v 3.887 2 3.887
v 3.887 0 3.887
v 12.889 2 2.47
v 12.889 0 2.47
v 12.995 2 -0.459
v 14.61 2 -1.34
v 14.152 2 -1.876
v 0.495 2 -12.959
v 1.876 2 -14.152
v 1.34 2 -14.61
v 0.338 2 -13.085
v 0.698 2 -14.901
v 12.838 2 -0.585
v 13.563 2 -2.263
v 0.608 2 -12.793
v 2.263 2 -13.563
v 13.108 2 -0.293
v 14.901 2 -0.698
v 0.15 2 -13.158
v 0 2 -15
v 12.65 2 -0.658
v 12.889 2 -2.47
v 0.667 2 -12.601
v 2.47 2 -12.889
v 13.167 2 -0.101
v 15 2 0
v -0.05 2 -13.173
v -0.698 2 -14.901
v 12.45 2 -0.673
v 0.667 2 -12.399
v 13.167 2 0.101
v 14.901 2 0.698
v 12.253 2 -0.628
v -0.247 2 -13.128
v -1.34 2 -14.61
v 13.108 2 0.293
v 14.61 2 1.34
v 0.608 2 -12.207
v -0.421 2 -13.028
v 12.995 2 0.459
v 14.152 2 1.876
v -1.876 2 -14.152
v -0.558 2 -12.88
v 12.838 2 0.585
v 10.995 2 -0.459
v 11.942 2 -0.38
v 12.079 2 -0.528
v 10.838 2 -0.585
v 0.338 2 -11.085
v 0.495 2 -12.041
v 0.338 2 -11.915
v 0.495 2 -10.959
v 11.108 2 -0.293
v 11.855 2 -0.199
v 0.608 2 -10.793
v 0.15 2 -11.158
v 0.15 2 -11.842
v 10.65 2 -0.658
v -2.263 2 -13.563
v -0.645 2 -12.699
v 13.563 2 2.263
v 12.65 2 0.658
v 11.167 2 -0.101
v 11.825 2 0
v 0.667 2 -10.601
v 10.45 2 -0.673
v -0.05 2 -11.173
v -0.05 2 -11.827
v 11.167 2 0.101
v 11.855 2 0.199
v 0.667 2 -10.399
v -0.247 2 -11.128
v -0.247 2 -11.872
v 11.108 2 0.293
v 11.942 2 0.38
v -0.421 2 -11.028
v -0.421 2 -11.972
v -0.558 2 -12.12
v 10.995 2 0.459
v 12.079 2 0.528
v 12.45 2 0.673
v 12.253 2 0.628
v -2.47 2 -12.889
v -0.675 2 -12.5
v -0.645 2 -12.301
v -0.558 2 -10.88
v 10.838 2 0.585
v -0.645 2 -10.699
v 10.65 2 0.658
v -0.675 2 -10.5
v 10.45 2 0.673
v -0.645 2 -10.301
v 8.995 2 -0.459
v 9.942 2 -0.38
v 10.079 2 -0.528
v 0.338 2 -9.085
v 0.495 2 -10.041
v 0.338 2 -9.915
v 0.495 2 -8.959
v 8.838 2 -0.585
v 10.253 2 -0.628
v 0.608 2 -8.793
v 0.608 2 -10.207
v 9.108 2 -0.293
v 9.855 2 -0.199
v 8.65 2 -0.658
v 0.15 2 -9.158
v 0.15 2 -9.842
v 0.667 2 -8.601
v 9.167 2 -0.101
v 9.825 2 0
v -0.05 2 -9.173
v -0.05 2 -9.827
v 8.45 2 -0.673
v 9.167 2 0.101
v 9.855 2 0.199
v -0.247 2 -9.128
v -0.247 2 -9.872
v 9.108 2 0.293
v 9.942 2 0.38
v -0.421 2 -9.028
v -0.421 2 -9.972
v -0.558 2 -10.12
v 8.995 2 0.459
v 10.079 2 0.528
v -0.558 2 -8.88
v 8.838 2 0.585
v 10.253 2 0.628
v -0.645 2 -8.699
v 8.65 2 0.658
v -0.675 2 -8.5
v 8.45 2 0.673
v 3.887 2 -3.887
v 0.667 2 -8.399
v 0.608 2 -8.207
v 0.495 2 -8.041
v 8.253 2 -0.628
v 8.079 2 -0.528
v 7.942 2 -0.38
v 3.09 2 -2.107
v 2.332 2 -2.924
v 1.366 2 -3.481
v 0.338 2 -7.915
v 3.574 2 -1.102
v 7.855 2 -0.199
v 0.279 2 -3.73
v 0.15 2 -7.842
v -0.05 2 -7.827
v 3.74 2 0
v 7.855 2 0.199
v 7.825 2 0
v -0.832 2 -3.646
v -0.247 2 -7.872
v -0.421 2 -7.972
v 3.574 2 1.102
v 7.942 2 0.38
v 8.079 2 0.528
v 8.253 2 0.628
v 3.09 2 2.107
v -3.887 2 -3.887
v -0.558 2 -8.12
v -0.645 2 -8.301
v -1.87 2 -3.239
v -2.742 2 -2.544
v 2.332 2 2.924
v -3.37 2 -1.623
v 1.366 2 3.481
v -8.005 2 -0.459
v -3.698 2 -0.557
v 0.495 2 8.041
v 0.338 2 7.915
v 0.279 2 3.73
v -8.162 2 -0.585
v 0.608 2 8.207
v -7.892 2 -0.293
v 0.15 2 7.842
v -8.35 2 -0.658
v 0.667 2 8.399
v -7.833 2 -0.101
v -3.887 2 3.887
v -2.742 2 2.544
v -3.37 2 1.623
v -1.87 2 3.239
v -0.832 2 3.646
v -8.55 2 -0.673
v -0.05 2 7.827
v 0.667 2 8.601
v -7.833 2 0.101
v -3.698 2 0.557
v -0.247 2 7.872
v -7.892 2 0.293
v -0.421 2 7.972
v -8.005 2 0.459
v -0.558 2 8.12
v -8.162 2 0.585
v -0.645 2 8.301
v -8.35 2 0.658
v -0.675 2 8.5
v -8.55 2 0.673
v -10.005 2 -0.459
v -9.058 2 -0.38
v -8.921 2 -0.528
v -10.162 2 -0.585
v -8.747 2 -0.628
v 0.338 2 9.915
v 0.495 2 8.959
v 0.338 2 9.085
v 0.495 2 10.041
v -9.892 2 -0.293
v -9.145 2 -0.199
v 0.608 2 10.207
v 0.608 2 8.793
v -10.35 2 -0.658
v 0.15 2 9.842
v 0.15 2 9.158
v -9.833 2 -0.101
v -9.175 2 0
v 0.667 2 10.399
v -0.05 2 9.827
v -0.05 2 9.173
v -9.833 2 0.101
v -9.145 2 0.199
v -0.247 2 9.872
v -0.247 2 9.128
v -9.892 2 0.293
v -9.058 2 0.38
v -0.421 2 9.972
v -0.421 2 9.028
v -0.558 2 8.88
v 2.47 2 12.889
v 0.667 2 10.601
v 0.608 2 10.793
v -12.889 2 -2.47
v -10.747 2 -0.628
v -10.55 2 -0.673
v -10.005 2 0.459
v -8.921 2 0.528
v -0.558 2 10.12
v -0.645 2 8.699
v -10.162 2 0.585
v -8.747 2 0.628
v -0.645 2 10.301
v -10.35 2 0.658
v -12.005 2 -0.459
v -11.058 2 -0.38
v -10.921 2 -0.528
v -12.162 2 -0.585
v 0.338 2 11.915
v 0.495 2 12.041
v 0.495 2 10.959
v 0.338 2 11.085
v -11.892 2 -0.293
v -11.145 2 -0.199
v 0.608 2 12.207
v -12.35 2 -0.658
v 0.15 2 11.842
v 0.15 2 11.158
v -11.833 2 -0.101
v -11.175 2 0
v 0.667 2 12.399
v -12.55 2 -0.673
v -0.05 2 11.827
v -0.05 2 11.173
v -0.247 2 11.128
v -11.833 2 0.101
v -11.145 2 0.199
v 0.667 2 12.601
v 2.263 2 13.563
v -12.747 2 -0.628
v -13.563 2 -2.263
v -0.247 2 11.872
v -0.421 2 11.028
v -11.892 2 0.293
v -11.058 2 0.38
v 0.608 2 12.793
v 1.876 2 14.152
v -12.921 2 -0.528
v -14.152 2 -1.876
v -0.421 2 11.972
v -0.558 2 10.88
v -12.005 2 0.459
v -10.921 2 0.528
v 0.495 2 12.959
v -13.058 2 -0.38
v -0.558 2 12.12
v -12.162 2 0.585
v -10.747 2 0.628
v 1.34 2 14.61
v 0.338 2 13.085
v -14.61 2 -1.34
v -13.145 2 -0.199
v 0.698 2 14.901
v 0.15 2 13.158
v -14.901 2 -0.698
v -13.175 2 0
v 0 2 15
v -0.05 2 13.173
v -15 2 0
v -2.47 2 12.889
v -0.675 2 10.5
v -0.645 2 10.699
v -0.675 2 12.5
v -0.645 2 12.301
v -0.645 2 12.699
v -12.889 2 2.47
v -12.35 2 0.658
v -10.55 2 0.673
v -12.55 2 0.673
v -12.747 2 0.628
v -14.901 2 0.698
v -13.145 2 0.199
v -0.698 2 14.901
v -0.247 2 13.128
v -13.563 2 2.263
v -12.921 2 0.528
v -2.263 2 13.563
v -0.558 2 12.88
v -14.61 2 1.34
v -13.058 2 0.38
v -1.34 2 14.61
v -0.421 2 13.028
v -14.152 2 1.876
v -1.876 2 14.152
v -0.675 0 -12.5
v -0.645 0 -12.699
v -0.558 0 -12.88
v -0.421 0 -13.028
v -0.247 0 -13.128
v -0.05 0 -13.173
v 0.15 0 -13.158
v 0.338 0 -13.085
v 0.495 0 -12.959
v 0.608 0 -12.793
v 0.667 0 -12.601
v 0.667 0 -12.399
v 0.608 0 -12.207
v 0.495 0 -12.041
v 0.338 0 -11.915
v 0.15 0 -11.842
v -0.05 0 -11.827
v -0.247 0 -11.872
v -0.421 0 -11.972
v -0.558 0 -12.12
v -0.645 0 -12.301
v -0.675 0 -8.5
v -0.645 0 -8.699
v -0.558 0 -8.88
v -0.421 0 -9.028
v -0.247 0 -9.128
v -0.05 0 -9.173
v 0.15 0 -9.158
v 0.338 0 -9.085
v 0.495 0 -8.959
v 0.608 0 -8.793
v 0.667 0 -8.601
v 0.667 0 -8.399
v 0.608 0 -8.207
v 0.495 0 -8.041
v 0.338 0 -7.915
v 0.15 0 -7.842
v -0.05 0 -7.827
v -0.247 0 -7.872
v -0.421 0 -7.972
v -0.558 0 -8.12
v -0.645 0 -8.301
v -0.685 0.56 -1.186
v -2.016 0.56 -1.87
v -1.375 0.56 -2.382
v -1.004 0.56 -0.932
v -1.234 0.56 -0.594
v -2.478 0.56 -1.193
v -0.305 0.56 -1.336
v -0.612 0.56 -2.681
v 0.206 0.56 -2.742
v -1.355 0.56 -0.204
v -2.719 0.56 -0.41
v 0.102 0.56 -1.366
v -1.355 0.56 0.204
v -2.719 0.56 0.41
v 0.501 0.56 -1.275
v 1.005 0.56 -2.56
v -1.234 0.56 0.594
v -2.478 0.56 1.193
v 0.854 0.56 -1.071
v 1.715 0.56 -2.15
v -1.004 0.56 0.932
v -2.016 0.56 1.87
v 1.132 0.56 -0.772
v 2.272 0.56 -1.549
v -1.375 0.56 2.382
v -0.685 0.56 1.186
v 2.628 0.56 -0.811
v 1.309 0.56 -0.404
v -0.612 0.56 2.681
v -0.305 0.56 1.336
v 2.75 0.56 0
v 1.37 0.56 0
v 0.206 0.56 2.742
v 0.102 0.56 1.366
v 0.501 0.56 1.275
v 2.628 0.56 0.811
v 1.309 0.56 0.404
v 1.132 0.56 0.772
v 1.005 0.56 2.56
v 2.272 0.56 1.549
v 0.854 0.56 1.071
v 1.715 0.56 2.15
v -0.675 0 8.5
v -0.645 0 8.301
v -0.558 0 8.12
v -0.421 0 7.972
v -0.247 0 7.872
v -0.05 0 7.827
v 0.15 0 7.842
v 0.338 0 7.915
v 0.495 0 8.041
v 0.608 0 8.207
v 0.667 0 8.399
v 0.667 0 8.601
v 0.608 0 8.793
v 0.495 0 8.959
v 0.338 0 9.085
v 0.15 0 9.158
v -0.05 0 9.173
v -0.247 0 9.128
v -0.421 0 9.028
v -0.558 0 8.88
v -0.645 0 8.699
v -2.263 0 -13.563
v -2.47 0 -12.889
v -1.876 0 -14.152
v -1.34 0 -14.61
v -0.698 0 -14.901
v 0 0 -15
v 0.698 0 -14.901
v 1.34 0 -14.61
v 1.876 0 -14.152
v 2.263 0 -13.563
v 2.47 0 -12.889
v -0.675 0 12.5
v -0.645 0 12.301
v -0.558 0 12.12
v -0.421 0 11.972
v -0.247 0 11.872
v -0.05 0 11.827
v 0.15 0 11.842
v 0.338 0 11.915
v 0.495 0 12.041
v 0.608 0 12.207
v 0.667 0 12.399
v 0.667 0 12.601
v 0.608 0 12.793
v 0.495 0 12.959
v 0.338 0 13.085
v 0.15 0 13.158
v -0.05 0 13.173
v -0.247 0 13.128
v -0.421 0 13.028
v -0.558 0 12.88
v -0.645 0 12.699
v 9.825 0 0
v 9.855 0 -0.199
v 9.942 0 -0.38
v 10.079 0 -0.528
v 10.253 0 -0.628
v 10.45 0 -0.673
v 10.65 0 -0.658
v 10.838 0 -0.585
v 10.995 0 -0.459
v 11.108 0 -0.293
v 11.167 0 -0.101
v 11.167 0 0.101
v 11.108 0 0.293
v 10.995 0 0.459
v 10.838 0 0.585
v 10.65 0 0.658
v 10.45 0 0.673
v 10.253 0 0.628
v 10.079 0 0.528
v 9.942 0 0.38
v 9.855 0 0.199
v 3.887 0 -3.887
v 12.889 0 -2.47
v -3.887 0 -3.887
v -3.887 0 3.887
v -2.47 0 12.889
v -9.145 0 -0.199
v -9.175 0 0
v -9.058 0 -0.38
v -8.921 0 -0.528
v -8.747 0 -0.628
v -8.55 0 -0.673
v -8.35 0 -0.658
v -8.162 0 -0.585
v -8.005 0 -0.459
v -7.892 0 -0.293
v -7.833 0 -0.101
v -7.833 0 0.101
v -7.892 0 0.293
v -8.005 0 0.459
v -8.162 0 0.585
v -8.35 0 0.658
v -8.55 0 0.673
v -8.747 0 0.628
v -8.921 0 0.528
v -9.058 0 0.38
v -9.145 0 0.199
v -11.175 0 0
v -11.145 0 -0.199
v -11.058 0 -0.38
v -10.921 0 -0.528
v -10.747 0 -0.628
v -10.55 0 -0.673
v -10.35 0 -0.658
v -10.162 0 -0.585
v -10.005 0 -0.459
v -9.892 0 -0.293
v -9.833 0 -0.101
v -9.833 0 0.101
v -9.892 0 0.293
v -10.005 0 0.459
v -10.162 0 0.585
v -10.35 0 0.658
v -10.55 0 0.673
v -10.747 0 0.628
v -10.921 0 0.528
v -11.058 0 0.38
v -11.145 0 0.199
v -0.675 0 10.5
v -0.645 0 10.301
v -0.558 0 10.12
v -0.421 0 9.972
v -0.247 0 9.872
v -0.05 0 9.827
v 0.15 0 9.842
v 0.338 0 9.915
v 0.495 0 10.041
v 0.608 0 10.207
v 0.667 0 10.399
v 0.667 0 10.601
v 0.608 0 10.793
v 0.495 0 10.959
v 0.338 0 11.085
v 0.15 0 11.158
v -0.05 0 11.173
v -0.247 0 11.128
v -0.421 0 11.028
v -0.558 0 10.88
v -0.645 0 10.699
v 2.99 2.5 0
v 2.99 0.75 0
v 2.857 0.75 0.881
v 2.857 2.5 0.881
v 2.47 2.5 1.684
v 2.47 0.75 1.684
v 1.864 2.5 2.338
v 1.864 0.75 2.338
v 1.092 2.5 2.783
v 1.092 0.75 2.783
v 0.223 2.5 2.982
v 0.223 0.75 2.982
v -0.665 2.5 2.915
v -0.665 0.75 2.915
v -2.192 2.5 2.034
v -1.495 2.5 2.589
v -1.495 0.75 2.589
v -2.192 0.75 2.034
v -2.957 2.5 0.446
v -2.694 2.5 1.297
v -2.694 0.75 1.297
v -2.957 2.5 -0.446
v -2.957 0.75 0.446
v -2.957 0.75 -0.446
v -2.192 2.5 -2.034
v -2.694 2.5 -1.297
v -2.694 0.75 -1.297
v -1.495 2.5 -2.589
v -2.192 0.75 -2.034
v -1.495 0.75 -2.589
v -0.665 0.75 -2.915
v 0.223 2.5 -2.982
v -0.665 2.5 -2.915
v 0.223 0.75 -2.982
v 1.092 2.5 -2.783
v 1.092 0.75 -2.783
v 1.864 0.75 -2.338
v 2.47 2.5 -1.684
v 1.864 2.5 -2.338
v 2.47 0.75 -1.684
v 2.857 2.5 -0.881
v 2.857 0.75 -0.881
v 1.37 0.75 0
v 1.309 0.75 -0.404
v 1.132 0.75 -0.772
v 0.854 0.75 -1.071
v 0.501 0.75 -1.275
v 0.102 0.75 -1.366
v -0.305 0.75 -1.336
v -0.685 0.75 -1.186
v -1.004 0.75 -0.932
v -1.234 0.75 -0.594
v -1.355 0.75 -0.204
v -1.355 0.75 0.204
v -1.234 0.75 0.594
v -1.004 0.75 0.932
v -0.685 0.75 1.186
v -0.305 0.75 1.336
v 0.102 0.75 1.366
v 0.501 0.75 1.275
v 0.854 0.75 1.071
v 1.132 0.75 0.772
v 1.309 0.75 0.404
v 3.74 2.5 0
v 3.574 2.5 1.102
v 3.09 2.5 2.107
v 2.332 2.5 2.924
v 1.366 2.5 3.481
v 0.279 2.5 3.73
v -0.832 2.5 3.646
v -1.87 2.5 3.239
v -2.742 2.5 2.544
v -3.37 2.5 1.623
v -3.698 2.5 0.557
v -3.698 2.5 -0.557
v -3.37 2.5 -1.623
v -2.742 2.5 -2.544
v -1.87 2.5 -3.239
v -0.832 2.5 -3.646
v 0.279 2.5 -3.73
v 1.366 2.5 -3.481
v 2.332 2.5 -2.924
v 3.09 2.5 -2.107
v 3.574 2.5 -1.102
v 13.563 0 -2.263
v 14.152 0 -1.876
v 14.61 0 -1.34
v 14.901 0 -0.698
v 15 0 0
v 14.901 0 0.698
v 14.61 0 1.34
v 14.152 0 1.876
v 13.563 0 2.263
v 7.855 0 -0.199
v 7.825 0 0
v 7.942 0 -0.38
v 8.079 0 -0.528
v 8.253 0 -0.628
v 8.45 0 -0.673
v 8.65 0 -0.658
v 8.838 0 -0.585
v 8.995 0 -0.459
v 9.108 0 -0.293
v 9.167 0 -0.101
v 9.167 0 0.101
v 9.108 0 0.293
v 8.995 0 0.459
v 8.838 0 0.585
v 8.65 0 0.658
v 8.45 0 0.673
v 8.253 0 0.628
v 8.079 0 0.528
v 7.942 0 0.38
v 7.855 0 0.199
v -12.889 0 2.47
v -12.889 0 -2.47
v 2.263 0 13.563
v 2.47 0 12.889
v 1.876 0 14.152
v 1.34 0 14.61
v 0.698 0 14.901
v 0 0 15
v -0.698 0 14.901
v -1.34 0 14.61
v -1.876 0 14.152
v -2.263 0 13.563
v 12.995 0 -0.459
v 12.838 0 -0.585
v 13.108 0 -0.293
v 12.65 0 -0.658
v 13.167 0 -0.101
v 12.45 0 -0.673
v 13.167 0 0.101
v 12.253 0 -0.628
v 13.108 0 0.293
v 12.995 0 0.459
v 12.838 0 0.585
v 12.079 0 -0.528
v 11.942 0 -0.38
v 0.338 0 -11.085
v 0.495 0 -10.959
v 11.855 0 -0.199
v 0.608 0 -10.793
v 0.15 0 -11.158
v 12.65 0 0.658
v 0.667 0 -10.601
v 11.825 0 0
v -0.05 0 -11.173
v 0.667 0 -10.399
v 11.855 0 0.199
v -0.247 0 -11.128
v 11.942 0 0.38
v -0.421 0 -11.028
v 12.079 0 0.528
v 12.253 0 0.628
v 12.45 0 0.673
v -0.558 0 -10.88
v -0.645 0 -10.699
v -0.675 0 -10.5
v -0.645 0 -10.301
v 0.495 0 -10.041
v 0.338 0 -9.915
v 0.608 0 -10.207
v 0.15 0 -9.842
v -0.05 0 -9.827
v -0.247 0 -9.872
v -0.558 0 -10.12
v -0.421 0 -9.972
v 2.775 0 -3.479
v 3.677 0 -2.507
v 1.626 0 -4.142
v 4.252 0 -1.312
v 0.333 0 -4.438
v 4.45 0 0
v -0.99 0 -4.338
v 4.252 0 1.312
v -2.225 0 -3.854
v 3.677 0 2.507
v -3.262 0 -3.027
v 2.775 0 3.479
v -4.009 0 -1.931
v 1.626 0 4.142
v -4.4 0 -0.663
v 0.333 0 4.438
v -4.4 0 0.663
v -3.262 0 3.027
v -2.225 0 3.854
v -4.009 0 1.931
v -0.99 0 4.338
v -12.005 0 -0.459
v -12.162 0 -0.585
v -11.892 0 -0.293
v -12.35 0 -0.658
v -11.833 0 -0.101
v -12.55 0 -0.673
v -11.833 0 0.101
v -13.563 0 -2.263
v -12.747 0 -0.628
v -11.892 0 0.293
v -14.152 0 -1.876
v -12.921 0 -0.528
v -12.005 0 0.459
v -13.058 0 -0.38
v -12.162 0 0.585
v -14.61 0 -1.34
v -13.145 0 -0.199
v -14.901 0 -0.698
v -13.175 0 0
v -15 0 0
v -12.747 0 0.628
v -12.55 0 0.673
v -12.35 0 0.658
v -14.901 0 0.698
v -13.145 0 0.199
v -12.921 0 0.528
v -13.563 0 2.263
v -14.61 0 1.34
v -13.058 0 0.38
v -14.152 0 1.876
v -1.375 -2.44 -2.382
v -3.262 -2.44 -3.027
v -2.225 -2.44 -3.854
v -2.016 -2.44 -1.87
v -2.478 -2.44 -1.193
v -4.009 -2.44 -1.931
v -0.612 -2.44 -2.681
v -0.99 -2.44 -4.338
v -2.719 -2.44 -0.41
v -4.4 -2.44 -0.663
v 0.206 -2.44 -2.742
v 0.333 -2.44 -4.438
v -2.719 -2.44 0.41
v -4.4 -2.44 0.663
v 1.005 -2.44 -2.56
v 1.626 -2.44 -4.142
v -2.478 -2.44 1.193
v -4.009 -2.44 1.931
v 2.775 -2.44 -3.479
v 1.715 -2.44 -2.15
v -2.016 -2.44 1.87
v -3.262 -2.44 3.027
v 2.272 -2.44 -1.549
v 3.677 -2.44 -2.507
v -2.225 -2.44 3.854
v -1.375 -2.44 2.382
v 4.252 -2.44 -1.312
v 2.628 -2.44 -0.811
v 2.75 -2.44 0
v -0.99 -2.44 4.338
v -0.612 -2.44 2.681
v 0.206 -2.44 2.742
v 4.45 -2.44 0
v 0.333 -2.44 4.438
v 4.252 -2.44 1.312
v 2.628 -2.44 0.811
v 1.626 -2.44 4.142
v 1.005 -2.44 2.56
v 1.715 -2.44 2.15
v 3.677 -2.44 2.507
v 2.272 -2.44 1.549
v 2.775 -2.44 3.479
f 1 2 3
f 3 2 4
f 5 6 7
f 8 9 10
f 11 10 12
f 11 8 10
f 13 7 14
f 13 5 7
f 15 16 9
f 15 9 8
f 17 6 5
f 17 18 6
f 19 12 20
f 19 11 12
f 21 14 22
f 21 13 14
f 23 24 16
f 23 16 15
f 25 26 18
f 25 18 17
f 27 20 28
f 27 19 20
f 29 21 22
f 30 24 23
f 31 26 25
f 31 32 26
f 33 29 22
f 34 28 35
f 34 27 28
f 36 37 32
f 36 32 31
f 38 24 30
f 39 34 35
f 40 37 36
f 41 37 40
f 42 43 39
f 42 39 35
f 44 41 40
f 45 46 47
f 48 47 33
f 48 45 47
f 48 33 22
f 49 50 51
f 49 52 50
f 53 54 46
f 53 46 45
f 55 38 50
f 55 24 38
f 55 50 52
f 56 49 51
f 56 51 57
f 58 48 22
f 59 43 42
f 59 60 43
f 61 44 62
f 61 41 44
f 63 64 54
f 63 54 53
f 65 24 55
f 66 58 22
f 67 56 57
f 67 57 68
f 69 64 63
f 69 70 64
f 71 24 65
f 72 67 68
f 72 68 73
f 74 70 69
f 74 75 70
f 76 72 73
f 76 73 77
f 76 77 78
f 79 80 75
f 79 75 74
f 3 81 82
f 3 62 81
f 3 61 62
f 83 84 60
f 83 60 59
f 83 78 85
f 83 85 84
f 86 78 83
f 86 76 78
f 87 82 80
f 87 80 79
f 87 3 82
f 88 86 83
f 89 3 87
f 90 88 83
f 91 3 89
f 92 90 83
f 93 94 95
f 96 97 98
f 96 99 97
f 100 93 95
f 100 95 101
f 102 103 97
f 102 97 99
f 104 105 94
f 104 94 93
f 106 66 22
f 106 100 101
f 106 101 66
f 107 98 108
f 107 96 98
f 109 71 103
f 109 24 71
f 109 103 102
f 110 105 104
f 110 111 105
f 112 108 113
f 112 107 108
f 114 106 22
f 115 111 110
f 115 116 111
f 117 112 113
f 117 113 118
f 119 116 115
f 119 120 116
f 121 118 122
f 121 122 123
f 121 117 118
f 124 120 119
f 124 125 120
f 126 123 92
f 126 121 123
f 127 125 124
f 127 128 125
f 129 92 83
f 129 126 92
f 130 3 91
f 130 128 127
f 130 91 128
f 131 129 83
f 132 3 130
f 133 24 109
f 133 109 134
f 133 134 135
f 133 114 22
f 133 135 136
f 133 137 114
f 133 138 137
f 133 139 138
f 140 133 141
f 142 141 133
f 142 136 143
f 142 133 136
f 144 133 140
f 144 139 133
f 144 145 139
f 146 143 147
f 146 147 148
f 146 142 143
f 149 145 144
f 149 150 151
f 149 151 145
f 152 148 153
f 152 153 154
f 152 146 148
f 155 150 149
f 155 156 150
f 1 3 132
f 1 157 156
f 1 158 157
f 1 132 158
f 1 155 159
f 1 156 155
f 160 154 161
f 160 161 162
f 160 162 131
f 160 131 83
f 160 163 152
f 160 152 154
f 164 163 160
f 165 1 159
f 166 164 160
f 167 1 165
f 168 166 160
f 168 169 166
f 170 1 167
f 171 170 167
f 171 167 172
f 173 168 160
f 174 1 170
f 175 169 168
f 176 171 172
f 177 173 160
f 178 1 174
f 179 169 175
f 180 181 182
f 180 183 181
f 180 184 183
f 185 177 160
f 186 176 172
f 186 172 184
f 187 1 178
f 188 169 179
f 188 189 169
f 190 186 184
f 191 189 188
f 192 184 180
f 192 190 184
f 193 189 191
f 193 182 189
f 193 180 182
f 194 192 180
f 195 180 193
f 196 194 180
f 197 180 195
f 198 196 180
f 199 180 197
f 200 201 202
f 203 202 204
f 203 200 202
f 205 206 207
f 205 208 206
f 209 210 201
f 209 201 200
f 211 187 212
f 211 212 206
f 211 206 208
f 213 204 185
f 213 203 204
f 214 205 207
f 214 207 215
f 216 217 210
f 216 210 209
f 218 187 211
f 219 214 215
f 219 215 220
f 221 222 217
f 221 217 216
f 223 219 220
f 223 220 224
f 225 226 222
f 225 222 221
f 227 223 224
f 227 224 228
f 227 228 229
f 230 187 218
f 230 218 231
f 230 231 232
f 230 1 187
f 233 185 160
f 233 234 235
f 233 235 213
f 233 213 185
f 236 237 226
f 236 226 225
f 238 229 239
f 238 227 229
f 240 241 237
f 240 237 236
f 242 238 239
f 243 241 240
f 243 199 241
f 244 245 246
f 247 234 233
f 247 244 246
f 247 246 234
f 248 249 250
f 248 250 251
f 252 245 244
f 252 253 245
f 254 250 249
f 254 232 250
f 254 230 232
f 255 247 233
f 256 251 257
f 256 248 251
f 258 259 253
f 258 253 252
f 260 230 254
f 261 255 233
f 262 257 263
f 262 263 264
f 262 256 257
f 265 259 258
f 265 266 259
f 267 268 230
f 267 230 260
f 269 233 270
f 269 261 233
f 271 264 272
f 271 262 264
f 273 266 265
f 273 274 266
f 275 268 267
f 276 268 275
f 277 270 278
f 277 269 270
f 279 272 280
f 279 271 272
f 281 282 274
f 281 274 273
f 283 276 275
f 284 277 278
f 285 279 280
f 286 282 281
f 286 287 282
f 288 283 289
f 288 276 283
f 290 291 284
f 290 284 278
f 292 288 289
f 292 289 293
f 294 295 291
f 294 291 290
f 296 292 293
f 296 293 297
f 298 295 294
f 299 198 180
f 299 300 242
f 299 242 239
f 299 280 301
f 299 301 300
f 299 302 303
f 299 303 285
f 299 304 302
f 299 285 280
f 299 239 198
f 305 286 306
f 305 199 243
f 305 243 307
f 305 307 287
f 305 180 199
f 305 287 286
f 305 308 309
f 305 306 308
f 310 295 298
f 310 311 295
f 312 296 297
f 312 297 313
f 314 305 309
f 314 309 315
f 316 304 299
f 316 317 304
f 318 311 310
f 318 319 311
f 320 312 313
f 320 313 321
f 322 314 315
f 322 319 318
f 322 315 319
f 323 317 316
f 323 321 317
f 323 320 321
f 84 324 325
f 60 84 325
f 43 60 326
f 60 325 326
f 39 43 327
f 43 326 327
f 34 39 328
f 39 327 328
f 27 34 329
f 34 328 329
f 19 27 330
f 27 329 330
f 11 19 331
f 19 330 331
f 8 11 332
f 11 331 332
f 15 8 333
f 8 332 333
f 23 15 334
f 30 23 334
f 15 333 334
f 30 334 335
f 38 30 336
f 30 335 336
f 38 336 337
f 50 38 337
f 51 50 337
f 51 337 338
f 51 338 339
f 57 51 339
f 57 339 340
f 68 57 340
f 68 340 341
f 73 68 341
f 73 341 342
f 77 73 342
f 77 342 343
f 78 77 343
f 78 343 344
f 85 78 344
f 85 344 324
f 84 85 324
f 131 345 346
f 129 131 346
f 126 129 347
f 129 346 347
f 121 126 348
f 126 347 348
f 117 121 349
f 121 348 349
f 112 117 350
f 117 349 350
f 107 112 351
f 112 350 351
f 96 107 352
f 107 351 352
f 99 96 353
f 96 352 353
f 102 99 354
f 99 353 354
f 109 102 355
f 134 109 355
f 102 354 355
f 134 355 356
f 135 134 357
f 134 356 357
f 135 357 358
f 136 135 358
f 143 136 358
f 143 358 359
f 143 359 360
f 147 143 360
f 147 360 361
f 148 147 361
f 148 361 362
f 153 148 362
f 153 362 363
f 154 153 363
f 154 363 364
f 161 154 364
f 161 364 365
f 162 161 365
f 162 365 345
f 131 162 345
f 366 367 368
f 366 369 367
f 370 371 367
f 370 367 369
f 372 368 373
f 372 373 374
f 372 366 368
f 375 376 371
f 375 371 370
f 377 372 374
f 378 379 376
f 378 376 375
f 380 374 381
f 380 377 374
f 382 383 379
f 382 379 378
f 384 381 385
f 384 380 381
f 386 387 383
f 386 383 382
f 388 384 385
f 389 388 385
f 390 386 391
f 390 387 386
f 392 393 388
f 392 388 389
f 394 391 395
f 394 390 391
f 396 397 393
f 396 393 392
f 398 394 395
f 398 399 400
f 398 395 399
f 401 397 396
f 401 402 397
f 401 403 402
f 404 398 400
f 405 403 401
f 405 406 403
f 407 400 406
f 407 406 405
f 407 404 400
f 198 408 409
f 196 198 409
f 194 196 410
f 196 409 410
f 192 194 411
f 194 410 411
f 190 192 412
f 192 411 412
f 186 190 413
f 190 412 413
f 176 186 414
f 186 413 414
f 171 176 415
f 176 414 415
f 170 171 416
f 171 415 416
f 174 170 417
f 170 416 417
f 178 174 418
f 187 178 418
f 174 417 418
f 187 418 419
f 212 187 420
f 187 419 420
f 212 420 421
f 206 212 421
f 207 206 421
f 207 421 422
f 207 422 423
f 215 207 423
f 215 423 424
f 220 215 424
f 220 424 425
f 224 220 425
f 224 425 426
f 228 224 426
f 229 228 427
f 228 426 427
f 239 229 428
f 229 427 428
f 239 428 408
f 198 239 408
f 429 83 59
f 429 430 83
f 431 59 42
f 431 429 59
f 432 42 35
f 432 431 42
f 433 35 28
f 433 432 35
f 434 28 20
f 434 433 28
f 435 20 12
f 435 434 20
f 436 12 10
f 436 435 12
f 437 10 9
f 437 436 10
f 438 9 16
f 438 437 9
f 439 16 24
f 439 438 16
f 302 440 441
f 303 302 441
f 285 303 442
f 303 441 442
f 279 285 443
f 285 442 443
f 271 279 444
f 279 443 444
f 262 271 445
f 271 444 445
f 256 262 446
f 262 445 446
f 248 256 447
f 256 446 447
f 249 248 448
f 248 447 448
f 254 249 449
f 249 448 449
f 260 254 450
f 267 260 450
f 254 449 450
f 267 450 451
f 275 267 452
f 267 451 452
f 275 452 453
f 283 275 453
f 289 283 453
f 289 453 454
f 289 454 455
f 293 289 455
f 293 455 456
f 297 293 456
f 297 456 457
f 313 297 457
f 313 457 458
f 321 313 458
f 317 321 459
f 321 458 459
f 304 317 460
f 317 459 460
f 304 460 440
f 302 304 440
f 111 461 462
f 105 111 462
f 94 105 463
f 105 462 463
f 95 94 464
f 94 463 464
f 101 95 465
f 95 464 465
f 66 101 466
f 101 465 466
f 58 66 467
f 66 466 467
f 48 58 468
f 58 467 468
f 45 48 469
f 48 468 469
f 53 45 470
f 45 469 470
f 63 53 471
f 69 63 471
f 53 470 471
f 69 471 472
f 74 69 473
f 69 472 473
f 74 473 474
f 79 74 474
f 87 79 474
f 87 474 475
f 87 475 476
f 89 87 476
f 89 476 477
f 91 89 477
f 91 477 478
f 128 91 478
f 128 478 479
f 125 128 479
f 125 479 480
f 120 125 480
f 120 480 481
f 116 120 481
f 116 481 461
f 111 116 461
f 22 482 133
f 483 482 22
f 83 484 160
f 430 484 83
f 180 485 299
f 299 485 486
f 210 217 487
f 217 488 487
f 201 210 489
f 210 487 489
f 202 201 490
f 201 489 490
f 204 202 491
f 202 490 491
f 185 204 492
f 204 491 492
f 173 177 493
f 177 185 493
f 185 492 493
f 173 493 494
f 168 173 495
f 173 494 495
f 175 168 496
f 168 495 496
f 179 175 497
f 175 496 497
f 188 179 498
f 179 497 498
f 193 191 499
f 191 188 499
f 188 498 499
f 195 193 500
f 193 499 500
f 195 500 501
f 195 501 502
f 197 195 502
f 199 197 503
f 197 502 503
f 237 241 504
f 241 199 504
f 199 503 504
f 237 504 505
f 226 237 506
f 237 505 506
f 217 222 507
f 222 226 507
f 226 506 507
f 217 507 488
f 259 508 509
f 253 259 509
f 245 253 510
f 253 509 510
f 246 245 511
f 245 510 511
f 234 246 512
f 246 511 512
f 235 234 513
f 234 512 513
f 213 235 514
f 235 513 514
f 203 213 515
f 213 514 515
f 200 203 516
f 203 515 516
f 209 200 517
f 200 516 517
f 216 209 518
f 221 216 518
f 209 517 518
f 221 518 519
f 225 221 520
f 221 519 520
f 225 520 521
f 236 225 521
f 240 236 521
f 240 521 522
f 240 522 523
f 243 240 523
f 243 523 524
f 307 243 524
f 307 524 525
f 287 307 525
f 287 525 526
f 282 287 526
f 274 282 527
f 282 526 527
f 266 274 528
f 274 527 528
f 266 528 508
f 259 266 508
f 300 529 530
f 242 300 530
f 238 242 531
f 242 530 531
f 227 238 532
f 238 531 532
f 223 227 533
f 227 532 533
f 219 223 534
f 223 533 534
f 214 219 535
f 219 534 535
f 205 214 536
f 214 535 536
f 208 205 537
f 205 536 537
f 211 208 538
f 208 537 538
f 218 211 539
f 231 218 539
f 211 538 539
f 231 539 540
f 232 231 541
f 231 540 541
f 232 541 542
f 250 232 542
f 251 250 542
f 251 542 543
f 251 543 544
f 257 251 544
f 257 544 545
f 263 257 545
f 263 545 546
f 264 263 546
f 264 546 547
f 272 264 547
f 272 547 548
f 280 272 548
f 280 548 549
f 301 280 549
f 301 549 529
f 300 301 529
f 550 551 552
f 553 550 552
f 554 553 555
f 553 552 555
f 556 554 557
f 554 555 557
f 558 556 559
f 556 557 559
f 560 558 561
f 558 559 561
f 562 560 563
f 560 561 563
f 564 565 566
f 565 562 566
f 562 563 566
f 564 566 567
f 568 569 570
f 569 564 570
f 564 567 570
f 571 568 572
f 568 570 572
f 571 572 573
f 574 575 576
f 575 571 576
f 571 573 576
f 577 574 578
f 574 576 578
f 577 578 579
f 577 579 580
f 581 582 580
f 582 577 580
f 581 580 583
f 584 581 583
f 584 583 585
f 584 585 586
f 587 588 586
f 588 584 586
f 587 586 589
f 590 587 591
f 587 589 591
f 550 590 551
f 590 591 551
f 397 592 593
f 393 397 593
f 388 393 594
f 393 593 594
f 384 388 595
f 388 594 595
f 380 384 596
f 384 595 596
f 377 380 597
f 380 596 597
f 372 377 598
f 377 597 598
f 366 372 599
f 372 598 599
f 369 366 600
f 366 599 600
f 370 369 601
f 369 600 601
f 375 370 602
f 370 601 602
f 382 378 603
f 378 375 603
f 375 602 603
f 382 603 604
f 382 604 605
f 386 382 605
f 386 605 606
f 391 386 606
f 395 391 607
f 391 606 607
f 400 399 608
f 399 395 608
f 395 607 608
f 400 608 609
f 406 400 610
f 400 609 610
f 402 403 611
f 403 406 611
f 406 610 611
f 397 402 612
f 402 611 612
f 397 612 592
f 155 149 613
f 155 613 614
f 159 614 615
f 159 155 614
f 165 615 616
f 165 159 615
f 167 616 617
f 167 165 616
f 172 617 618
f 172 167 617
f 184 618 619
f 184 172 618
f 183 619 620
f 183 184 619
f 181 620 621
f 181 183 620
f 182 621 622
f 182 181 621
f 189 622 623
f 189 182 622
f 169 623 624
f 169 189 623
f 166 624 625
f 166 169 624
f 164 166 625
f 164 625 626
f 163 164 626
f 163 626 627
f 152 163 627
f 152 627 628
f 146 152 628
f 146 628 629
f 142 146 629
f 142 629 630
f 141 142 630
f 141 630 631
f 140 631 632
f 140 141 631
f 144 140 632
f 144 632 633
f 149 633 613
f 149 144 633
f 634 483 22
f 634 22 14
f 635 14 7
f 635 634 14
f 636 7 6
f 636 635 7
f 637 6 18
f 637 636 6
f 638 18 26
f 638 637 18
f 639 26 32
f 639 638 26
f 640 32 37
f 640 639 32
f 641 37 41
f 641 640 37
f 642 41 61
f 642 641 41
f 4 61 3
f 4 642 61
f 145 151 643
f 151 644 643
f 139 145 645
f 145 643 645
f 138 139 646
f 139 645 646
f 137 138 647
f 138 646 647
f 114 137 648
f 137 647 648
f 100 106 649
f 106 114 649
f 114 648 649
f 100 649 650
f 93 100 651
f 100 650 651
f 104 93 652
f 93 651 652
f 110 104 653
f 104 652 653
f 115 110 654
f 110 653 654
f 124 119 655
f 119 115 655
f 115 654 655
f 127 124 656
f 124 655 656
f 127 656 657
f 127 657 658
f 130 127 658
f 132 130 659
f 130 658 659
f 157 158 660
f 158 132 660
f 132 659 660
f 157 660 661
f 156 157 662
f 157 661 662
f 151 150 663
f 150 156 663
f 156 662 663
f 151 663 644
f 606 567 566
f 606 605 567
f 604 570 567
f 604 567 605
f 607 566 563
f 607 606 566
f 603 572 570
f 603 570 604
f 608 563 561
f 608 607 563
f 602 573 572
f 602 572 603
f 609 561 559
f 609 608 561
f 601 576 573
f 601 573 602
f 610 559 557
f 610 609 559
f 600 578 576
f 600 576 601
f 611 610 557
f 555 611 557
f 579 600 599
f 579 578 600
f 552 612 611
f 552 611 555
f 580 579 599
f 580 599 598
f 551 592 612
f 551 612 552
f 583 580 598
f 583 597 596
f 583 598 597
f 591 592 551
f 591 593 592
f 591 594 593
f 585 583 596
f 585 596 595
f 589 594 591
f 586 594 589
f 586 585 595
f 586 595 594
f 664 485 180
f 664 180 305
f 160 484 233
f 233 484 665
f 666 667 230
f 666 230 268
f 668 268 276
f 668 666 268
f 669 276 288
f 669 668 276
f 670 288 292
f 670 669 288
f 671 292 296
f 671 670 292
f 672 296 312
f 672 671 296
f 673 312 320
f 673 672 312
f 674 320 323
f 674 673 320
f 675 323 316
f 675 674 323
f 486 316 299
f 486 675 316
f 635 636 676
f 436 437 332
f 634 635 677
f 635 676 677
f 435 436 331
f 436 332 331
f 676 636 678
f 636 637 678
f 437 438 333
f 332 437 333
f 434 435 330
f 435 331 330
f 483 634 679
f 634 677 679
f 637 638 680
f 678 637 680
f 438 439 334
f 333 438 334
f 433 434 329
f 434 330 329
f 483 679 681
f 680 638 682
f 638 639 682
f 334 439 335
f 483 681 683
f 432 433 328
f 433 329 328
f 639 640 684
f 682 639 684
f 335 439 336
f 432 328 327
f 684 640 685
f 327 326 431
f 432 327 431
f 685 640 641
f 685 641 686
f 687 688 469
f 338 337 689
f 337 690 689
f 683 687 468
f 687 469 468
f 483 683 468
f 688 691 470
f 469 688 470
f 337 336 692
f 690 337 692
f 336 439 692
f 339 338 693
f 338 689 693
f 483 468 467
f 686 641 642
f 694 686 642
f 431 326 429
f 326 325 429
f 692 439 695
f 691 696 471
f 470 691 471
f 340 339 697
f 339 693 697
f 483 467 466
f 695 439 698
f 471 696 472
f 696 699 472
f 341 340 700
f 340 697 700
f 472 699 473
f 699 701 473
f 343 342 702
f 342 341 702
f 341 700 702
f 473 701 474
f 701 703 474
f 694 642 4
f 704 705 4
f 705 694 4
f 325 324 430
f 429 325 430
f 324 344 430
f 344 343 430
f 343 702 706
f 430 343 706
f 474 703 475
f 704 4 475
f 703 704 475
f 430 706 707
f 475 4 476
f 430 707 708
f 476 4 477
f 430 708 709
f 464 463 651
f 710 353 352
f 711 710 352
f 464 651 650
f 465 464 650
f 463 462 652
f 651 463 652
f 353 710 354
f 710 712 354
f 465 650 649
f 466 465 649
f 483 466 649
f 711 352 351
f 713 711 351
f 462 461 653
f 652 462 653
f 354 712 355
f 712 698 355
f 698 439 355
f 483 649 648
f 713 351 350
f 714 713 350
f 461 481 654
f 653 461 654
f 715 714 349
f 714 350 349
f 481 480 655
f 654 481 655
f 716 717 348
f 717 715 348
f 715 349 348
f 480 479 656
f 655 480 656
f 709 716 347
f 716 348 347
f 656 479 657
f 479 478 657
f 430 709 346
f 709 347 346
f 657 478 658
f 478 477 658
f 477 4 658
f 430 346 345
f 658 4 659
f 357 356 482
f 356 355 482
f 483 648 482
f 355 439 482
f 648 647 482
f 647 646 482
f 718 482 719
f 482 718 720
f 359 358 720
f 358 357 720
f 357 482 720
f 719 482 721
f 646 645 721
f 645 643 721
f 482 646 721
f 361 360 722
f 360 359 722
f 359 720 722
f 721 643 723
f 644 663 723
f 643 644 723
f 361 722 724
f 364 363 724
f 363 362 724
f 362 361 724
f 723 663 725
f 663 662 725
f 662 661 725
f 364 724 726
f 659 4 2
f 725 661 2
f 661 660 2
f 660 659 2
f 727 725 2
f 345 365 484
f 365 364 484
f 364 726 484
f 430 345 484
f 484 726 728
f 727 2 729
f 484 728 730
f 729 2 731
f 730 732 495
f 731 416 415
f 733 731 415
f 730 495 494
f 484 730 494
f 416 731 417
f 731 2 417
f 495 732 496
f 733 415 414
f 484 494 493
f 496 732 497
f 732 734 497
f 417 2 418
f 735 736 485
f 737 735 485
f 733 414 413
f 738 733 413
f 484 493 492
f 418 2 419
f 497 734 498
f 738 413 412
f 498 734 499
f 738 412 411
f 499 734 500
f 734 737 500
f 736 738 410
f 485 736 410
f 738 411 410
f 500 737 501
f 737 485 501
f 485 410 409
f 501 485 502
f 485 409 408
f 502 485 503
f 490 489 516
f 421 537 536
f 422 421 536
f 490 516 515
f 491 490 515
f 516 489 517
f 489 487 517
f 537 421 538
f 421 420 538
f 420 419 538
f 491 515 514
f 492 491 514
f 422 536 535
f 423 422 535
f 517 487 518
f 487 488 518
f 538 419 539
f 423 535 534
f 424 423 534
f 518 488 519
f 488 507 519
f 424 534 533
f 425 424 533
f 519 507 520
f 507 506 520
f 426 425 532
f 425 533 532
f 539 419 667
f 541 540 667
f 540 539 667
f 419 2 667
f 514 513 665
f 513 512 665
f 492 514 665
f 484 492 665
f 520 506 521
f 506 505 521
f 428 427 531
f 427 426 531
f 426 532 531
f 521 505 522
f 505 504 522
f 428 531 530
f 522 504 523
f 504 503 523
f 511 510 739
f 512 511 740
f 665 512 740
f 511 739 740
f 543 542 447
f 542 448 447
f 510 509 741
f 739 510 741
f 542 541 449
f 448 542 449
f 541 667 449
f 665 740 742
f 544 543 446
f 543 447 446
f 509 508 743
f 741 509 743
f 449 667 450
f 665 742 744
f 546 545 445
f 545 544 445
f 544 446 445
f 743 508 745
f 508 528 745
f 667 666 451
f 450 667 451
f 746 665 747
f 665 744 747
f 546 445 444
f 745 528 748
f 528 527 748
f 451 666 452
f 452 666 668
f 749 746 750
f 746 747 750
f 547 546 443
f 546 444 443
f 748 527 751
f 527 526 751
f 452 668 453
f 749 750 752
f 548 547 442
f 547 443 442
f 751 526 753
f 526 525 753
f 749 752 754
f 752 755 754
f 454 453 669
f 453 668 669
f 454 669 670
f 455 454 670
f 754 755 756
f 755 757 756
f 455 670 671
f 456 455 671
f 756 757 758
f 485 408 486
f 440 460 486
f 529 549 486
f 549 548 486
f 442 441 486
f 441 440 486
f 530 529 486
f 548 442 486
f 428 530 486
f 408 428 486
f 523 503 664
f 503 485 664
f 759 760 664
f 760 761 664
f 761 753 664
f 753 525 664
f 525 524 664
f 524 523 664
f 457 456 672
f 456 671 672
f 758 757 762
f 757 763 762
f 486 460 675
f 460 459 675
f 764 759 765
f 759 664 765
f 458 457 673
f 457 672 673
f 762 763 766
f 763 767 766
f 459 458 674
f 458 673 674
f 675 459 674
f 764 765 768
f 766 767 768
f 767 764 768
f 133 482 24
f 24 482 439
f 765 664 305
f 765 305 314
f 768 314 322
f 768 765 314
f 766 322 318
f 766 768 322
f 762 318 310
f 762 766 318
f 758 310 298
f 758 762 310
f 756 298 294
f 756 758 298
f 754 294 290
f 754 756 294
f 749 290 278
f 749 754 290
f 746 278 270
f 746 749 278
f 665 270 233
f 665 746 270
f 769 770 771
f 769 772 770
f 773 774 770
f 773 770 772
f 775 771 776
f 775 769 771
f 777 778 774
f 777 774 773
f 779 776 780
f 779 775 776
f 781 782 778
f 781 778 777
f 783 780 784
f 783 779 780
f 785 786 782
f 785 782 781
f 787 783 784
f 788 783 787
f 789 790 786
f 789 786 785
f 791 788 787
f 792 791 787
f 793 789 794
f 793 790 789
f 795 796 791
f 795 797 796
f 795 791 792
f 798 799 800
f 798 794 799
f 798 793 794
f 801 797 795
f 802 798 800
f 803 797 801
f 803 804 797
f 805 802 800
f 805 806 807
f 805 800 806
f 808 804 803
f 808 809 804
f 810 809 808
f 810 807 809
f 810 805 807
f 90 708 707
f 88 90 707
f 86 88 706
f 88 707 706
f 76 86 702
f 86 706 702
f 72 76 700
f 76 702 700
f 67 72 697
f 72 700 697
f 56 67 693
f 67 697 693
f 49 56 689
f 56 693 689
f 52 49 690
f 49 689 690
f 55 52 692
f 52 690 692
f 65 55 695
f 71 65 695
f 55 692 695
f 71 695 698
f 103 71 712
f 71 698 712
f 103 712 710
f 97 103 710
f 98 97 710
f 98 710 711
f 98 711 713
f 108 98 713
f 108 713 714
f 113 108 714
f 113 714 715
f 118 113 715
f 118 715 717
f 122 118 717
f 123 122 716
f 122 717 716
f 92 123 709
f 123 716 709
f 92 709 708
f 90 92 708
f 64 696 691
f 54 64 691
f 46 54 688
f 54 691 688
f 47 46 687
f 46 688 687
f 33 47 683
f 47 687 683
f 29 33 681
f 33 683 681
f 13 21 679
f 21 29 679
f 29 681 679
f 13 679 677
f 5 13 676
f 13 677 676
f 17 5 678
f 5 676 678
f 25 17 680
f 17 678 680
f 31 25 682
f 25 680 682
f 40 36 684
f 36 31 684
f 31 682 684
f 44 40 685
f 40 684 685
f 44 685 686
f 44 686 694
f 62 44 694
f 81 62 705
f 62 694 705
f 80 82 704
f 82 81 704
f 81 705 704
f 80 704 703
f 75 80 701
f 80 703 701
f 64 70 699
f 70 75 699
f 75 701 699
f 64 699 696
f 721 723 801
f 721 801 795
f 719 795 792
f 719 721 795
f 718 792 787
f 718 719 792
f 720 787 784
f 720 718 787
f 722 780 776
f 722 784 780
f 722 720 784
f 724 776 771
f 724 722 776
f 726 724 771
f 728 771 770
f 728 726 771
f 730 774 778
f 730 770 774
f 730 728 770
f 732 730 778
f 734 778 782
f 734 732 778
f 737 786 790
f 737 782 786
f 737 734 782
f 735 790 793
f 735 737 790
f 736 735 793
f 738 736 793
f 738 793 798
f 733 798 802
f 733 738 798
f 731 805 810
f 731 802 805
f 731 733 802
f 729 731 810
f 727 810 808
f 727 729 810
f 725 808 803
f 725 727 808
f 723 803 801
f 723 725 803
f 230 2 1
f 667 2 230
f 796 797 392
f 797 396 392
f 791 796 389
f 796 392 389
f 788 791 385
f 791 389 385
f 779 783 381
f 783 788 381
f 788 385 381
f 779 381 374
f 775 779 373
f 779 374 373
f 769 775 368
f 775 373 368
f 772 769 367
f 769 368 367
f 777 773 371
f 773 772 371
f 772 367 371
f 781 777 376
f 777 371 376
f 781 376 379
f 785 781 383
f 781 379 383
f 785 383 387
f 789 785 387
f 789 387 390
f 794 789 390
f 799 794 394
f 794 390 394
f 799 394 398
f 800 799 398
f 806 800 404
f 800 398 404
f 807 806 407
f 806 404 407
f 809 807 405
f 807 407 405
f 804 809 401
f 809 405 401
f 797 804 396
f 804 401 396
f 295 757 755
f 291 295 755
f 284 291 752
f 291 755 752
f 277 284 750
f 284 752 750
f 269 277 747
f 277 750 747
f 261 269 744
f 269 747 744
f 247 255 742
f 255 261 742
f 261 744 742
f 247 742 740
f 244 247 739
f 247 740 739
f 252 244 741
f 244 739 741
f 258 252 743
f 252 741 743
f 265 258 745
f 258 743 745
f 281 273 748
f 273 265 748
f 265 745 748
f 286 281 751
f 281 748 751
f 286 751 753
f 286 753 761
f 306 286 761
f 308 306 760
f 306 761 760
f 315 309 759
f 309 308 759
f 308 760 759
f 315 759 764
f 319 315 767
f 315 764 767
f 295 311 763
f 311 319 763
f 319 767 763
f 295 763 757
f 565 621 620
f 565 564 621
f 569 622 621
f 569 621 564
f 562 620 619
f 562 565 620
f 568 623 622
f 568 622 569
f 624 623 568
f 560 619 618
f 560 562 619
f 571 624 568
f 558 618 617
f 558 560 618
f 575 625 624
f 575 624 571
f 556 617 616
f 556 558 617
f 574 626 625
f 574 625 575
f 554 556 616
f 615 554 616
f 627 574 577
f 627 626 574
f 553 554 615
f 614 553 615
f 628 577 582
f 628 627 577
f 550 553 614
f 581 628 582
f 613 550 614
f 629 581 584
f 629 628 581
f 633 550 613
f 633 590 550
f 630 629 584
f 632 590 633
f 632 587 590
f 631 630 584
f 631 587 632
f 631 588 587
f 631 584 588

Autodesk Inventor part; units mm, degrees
ref_plane "YZ Plane" through (0, 0, 0) normal (1, 0, 0) x (0, 1, 0)
ref_plane "XZ Plane" through (0, 0, 0) normal (0, 1, 0) x (-1, 0, 0)
ref_plane "XY Plane" through (0, 0, 0) normal (0, 0, 1) x (1, 0, 0)
sketch "Sketch1" plane through (0, 0, 0) normal (0, 1, 0) x (-1, 0, 0)
  circle A0 centre (0, 0) radius 10.5 construction
  circle A1 centre (0, 0) radius 12.5 construction
  circle A2 centre (0, 0) radius 8.5 construction
  circle A3 centre (12.5, 0) radius 2.5
  circle A4 centre (12.5, 0) radius 0.675
  circle A5 centre (10.5, 0) radius 0.675
  circle A6 centre (8.5, 0) radius 0.675
  line L0 (0, 16.4462) -> (0, -19.2601)
  circle A7 centre (0, 12.5) radius 0.675
  circle A8 centre (0, 10.5) radius 0.675
  circle A9 centre (0, 12.5) radius 2.5
  circle A10 centre (0, 8.5) radius 0.675
  circle A11 centre (-12.5, 0) radius 0.675
  circle A12 centre (-10.5, 0) radius 0.675
  circle A13 centre (-12.5, 0) radius 2.5
  circle A14 centre (-8.5, 0) radius 0.675
  circle A15 centre (0, -12.5) radius 0.675
  circle A16 centre (0, -10.5) radius 0.675
  circle A17 centre (0, -12.5) radius 2.5
  circle A18 centre (0, -8.5) radius 0.675
  line L1 (0, 0) -> (7.0711, -7.0711) construction
  line L2 (0, 0) -> (10, 0) construction
  line L3 (0, 0) -> (7.0711, 7.0711) construction
  line L4 (0, 0) -> (10, 0) construction
  line L5 (0, 0) -> (7.0711, -7.0711) construction
  line L6 (0, 0) -> (10, 0) construction
  line L7 (0, 0) -> (-7.0711, -7.0711) construction
  line L8 (0, 0) -> (10, 0) construction
  line L9 (3.8872, -3.8872) -> (12.8889, -2.4696)
  line L10 (3.8872, -3.8872) -> (2.4696, -12.8889)
  line L11 (3.8872, 3.8872) -> (2.4696, 12.8889)
  line L12 (3.8872, 3.8872) -> (12.8889, 2.4696)
  line L13 (-3.8872, 3.8872) -> (-12.8889, 2.4696)
  line L14 (-3.8872, 3.8872) -> (-2.4696, 12.8889)
  line L15 (-3.8872, -3.8872) -> (-2.4696, -12.8889)
  line L16 (-3.8872, -3.8872) -> (-12.8889, -2.4696)
  point P0 (13.5701, 2.2594)
  point P1 (14.0204, -1.9845)
  point P2 (-2.2594, 13.5701)
  point P3 (1.9845, 14.0204)
  point P4 (-13.5701, -2.2594)
  point P5 (-14.0204, 1.9845)
  point P6 (2.2594, -13.5701)
  point P7 (-1.9845, -14.0204)
  dimension "d0" = 21
  dimension "d1" = 25
  dimension "d2" = 17
  dimension "d3" = 5
  dimension "d4" = 1.35
  dimension "d5" = 1.35
  dimension "d6" = 1.35
  dimension "d9" = 360
  dimension "d11" = 10
  dimension "d12" = 45
  dimension "d13" = 10
  dimension "d14" = 45
  dimension "d15" = 10
  dimension "d16" = 45
  dimension "d17" = 10
  dimension "d18" = 135
  dimension "d19" = 107.9
  dimension "d20" = 12.5
  dimension "d21" = 10.5
  dimension "d22" = 2
  dimension "d23" = 8.5
  dimension "d24" = 8.5
  dimension "d25" = 10.5
  dimension "d26" = 12.5
  dimension "d27" = 12.5
  dimension "d30" = 360
extrude "Extrusion1" add sketch "Sketch1" along normal blind 2 contours A3 A5 | A3 A5 L9 L10 A17 A16 L0 A18 A10 A8 A9 L11 L12 | A9 A8 L0 A7 | A17 L0 A15 A16 | L0 A7 A8 A9 | A17 A16 L0 A15 | A9 A8 L0 A10 A18 A16 A17 L15 L16 A13 A12 L13 L14 | A13 A12 picked at (11.2959, 0.9935) picked at (-11.3085, -0.9832)
sketch "Sketch2" plane through (0, 2, 0) normal (0, 1, 0) x (1, 0, 0)
  circle A0 centre (0, 0) radius 3.74
  circle A1 centre (0, 0) radius 2.99
  circle A2 centre (0, 0) radius 1.37
  dimension "d34" = 7.48
  dimension "d35" = 5.98
  dimension "d36" = 2.74
extrude "Extrusion2" add sketch "Sketch2" along normal blind 0.5 contours A0
extrude "Extrusion3" cut sketch "Sketch2" against normal blind 1.25 contours A1
extrude "Extrusion4" cut sketch "Sketch2" against normal through all contours A2
sketch "Sketch3" plane through (0, 0, 0) normal (0, -1, 0) x (1, 0, 0)
  circle A0 centre (0, 0) radius 1.37 projected
  circle A1 centre (0, 0) radius 2.75
  circle A2 centre (0, 0) radius 4.45
  dimension "d43" = 5.5
  dimension "d44" = 8.9
extrude "Extrusion5" add sketch "Sketch3" along normal blind 2.44 contours A2
extrude "Extrusion6" cut sketch "Sketch3" against normal blind 0.56 contours A1
properties part number "MMAE 232 CAD Assignment 2 Servo Horn 5-Nicholas Skiba"
